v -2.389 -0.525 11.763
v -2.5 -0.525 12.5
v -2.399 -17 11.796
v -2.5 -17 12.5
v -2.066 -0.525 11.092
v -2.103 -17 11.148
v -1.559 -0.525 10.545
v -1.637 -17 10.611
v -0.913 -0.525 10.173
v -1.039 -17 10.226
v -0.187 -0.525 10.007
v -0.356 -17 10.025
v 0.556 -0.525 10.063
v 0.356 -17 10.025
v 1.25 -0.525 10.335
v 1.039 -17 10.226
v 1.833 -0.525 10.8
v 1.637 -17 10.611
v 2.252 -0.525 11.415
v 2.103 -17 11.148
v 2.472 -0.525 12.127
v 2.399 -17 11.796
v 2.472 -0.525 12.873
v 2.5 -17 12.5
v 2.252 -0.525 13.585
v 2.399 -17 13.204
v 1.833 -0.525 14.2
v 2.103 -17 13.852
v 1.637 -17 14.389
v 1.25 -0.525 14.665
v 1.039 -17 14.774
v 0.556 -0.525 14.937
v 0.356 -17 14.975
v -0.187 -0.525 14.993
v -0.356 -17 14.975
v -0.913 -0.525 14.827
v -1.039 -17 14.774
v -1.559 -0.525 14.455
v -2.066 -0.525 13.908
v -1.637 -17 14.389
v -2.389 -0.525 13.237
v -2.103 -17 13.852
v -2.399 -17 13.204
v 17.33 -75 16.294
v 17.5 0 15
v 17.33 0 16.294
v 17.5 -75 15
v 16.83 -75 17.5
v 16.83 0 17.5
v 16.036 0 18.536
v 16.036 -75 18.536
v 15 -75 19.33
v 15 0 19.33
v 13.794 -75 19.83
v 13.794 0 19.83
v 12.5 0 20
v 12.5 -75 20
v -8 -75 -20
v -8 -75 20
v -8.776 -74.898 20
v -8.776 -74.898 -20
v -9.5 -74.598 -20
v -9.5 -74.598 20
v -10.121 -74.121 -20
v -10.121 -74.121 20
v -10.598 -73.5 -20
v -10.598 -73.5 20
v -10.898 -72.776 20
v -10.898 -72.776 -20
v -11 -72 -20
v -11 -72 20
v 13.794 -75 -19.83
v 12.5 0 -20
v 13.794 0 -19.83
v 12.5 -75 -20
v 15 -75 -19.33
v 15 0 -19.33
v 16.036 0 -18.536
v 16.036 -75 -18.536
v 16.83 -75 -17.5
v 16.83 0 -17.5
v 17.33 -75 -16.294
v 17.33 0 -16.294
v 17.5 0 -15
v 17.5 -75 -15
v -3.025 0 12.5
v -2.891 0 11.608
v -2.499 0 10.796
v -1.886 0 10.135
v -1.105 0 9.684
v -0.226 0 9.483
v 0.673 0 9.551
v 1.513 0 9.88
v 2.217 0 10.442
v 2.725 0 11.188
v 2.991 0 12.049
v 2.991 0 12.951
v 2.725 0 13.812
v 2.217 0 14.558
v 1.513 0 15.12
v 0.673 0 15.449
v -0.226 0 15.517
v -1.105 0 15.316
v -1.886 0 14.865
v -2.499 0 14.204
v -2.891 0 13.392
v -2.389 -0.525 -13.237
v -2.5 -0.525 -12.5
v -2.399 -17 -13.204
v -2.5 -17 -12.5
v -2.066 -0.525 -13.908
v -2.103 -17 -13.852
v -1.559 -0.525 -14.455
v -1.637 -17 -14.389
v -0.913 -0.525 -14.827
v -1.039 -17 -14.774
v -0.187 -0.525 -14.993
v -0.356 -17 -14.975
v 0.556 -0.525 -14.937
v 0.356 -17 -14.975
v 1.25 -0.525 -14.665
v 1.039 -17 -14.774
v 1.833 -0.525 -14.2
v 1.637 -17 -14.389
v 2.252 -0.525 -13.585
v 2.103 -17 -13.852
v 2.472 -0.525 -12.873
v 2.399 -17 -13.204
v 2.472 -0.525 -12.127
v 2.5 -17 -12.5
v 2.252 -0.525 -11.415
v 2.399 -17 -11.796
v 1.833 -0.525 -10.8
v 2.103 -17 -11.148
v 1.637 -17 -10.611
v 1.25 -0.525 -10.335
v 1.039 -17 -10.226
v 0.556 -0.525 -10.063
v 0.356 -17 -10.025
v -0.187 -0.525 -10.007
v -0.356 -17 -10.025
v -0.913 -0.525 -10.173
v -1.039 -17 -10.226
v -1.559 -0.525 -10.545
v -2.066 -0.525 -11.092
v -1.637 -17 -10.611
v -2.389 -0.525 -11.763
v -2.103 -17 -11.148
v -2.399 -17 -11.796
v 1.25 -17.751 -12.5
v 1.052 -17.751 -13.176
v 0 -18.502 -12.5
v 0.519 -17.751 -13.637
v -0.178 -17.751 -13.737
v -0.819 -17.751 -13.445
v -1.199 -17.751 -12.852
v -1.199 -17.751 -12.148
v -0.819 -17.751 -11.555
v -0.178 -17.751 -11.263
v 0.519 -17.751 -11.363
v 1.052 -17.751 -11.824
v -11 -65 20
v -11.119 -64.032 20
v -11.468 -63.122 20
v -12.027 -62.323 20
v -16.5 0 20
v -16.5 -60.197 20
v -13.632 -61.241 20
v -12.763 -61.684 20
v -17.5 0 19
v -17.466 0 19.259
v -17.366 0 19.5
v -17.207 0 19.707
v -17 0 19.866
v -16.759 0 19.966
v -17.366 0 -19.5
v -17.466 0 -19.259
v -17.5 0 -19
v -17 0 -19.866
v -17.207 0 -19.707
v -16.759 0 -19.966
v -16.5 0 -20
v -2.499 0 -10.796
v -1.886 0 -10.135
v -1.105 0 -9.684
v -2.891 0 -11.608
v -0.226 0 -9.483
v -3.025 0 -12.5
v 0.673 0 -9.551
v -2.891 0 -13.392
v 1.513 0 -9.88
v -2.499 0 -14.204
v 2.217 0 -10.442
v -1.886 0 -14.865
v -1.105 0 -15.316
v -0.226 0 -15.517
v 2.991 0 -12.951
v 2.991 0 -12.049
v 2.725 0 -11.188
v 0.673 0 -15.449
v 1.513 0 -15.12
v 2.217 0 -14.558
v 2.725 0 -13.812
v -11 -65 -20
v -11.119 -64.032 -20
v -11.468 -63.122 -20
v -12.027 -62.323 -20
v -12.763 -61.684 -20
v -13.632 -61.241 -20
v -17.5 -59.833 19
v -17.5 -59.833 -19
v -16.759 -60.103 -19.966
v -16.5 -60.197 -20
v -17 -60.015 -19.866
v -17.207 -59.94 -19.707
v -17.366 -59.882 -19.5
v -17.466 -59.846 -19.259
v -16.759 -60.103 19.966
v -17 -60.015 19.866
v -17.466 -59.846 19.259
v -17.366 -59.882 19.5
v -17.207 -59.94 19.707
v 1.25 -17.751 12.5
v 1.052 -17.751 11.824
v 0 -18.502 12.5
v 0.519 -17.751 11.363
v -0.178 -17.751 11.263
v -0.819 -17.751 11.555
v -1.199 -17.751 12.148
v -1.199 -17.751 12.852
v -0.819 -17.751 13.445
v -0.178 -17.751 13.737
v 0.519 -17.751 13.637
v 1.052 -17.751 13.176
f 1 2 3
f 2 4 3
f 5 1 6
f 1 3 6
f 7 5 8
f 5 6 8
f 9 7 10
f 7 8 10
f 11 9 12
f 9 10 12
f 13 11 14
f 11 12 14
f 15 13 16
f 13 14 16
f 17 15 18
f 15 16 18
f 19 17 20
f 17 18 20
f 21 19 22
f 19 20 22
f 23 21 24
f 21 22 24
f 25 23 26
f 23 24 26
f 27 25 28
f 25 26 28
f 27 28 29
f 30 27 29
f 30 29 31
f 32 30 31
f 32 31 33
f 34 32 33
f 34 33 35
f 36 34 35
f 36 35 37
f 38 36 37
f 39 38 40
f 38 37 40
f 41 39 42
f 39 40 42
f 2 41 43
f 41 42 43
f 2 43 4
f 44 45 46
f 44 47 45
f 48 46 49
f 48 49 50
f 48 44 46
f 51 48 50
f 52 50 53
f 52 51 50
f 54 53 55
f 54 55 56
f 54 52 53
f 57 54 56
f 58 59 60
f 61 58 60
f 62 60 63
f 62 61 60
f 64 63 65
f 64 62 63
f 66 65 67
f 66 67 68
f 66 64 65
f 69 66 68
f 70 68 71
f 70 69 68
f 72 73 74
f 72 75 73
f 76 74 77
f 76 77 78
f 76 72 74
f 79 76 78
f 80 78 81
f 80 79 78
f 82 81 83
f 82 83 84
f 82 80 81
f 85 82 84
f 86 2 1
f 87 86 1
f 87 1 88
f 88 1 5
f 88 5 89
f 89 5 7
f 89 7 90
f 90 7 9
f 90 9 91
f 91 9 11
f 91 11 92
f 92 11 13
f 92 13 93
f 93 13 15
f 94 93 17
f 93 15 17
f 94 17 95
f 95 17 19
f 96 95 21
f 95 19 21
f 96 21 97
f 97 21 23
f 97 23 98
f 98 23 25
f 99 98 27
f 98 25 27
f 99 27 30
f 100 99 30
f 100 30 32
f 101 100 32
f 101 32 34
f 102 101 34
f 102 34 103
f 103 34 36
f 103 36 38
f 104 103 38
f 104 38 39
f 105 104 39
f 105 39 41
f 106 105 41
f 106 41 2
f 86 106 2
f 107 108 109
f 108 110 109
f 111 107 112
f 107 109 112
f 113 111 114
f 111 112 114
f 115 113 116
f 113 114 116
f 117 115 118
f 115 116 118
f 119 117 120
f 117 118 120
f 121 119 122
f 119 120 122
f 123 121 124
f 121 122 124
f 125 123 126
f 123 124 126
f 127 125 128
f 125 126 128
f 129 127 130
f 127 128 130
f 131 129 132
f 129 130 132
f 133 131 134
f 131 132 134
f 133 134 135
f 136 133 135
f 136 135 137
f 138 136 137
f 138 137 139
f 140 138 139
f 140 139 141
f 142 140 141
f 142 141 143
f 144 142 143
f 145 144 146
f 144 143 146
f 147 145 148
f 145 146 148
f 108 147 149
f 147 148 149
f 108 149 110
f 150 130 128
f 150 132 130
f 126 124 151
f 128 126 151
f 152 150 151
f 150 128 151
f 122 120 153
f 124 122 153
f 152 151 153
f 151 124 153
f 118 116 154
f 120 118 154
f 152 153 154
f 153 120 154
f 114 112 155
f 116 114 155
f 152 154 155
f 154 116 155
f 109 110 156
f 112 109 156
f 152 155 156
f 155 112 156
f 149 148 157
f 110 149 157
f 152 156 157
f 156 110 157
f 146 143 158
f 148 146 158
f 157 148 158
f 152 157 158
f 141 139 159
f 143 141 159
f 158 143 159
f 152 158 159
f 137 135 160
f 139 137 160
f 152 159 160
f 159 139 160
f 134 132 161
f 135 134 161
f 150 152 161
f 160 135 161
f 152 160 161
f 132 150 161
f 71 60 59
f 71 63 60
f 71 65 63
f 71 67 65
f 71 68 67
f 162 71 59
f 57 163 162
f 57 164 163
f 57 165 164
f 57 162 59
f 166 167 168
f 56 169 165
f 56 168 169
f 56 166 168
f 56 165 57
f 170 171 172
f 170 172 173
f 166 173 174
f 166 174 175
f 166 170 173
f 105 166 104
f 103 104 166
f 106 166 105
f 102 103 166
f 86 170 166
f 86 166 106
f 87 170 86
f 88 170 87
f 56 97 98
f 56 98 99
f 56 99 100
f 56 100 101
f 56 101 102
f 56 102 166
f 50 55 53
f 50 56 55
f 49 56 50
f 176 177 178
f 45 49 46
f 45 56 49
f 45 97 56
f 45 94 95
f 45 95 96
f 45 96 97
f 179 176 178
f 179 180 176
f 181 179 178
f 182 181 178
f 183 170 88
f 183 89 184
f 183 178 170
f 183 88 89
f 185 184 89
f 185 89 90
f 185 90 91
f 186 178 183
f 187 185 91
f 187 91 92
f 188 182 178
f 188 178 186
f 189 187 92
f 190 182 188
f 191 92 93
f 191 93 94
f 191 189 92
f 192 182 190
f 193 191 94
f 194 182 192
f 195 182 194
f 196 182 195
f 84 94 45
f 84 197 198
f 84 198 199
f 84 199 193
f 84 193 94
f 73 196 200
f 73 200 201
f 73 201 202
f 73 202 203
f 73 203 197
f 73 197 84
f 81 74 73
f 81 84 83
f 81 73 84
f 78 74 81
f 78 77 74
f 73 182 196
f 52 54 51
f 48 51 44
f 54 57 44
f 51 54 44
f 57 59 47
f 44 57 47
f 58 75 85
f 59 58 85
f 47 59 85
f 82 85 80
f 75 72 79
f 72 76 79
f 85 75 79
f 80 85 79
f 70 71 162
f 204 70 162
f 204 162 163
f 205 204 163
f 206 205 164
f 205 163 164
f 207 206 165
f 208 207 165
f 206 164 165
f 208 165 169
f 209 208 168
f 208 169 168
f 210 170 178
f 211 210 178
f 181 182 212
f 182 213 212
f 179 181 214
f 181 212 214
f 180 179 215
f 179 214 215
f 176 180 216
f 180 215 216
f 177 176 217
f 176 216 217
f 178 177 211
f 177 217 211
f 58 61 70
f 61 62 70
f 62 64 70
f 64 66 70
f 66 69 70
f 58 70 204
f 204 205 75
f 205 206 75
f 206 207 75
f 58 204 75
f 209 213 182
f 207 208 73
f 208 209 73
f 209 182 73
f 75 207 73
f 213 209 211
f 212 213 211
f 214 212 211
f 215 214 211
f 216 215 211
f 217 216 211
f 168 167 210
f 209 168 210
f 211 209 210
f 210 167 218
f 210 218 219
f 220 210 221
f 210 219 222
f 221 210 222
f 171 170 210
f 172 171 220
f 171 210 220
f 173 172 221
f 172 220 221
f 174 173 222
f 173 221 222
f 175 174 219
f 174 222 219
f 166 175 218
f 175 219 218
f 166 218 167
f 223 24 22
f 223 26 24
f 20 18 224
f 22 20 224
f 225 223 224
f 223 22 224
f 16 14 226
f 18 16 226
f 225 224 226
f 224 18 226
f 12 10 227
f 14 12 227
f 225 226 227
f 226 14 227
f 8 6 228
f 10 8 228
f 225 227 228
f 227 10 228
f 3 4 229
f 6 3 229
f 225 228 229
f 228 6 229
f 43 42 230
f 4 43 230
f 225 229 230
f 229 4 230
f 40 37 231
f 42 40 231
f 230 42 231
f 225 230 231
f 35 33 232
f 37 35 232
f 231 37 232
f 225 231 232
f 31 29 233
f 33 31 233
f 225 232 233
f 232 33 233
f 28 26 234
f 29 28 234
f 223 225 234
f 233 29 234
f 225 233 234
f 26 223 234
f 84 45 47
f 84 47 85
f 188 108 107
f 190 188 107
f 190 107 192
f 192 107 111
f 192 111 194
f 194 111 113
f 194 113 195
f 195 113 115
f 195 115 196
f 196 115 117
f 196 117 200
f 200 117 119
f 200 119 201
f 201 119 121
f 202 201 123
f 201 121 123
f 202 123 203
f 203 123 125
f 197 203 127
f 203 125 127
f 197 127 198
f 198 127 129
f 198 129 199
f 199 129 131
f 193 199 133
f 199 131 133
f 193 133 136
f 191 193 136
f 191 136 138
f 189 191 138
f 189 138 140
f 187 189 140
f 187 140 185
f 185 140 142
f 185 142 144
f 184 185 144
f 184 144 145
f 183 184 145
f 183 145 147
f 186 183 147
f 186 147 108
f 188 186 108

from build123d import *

# Parameters (mm, degrees)
SKETCH1_W                   = 35
SKETCH1_H                   = 40
BOSS_EXTRUDE1_DEPTH         = 75
CUT_EXTRUDE1_REACH          = 88.783
FILLET1_R                   = 3
FILLET2_R                   = 5
M6_TAPPED_HOLE1_D           = 5
M6_TAPPED_HOLE1_DEPTH       = 17
M6_TAPPED_HOLE1_CSINK_D     = 6.05
M6_TAPPED_HOLE1_CSINK_ANGLE = 90
M6_TAPPED_HOLE1_TIP         = 1.502151548
FILLET3_R                   = 1


with BuildPart() as part:
    # Sketch1 → Boss-Extrude1 (new body)
    with BuildSketch(Plane(origin=(0, 0, 0), x_dir=(1, 0, 0), z_dir=(0, 1, 0))):
        Rectangle(SKETCH1_W, SKETCH1_H)
    extrude(amount=-BOSS_EXTRUDE1_DEPTH)

    # Sketch2 → Cut-Extrude1 (cut, up to next)
    with BuildSketch(Plane.XY.offset(20), mode=Mode.PRIVATE) as cut_extrude1_sk1:
        with BuildLine():
            Line((-13.631919427, -61.241229517), (-17.5, -59.833363324))
            Line((-17.5, -59.833363324), (-17.5, -75))
            Line((-17.5, -75), (-11, -75))
            Line((-11, -75), (-11, -65))
            ThreePointArc((-11, -65), (-11.723391823, -62.705694255), (-13.631919427, -61.241229517))
        make_face()
    cut_extrude1_tool1 = extrude(cut_extrude1_sk1.sketch, amount=-CUT_EXTRUDE1_REACH, mode=Mode.PRIVATE) & part.part
    add(cut_extrude1_tool1.solids().sort_by_distance((-14.386052, -68.077717, 20))[0], mode=Mode.SUBTRACT)

    # Fillet1
    fillet1_edges = [part.edges().sort_by_distance(p)[0] for p in [
        (-11, -75, 0),
    ]]
    fillet(fillet1_edges, radius=FILLET1_R)

    # Fillet2
    fillet2_edges = [part.edges().sort_by_distance(p)[0] for p in [
        (17.5, -37.5, 20),
        (17.5, -37.5, -20),
    ]]
    fillet(fillet2_edges, radius=FILLET2_R)

    # M6 Tapped Hole1
    with Locations(Plane(origin=(0, 0, 0), x_dir=(1, 0, 0), z_dir=(0, 1, 0))):
        with Locations((0, 12.5), (0, -12.5)):
            CounterSinkHole(M6_TAPPED_HOLE1_D / 2, M6_TAPPED_HOLE1_CSINK_D / 2, depth=M6_TAPPED_HOLE1_DEPTH, counter_sink_angle=M6_TAPPED_HOLE1_CSINK_ANGLE)
            with Locations((0, 0, -(M6_TAPPED_HOLE1_DEPTH + M6_TAPPED_HOLE1_TIP / 2))):  # 118° drill point
                Cone(0, M6_TAPPED_HOLE1_D / 2, M6_TAPPED_HOLE1_TIP, mode=Mode.SUBTRACT)

    # Fillet3
    fillet3_edges = [part.edges().sort_by_distance(p)[0] for p in [
        (-17.5, -29.916681662, -20),
        (-17.5, -29.916681662, 20),
    ]]
    fillet(fillet3_edges, radius=FILLET3_R)


solid = part.part
